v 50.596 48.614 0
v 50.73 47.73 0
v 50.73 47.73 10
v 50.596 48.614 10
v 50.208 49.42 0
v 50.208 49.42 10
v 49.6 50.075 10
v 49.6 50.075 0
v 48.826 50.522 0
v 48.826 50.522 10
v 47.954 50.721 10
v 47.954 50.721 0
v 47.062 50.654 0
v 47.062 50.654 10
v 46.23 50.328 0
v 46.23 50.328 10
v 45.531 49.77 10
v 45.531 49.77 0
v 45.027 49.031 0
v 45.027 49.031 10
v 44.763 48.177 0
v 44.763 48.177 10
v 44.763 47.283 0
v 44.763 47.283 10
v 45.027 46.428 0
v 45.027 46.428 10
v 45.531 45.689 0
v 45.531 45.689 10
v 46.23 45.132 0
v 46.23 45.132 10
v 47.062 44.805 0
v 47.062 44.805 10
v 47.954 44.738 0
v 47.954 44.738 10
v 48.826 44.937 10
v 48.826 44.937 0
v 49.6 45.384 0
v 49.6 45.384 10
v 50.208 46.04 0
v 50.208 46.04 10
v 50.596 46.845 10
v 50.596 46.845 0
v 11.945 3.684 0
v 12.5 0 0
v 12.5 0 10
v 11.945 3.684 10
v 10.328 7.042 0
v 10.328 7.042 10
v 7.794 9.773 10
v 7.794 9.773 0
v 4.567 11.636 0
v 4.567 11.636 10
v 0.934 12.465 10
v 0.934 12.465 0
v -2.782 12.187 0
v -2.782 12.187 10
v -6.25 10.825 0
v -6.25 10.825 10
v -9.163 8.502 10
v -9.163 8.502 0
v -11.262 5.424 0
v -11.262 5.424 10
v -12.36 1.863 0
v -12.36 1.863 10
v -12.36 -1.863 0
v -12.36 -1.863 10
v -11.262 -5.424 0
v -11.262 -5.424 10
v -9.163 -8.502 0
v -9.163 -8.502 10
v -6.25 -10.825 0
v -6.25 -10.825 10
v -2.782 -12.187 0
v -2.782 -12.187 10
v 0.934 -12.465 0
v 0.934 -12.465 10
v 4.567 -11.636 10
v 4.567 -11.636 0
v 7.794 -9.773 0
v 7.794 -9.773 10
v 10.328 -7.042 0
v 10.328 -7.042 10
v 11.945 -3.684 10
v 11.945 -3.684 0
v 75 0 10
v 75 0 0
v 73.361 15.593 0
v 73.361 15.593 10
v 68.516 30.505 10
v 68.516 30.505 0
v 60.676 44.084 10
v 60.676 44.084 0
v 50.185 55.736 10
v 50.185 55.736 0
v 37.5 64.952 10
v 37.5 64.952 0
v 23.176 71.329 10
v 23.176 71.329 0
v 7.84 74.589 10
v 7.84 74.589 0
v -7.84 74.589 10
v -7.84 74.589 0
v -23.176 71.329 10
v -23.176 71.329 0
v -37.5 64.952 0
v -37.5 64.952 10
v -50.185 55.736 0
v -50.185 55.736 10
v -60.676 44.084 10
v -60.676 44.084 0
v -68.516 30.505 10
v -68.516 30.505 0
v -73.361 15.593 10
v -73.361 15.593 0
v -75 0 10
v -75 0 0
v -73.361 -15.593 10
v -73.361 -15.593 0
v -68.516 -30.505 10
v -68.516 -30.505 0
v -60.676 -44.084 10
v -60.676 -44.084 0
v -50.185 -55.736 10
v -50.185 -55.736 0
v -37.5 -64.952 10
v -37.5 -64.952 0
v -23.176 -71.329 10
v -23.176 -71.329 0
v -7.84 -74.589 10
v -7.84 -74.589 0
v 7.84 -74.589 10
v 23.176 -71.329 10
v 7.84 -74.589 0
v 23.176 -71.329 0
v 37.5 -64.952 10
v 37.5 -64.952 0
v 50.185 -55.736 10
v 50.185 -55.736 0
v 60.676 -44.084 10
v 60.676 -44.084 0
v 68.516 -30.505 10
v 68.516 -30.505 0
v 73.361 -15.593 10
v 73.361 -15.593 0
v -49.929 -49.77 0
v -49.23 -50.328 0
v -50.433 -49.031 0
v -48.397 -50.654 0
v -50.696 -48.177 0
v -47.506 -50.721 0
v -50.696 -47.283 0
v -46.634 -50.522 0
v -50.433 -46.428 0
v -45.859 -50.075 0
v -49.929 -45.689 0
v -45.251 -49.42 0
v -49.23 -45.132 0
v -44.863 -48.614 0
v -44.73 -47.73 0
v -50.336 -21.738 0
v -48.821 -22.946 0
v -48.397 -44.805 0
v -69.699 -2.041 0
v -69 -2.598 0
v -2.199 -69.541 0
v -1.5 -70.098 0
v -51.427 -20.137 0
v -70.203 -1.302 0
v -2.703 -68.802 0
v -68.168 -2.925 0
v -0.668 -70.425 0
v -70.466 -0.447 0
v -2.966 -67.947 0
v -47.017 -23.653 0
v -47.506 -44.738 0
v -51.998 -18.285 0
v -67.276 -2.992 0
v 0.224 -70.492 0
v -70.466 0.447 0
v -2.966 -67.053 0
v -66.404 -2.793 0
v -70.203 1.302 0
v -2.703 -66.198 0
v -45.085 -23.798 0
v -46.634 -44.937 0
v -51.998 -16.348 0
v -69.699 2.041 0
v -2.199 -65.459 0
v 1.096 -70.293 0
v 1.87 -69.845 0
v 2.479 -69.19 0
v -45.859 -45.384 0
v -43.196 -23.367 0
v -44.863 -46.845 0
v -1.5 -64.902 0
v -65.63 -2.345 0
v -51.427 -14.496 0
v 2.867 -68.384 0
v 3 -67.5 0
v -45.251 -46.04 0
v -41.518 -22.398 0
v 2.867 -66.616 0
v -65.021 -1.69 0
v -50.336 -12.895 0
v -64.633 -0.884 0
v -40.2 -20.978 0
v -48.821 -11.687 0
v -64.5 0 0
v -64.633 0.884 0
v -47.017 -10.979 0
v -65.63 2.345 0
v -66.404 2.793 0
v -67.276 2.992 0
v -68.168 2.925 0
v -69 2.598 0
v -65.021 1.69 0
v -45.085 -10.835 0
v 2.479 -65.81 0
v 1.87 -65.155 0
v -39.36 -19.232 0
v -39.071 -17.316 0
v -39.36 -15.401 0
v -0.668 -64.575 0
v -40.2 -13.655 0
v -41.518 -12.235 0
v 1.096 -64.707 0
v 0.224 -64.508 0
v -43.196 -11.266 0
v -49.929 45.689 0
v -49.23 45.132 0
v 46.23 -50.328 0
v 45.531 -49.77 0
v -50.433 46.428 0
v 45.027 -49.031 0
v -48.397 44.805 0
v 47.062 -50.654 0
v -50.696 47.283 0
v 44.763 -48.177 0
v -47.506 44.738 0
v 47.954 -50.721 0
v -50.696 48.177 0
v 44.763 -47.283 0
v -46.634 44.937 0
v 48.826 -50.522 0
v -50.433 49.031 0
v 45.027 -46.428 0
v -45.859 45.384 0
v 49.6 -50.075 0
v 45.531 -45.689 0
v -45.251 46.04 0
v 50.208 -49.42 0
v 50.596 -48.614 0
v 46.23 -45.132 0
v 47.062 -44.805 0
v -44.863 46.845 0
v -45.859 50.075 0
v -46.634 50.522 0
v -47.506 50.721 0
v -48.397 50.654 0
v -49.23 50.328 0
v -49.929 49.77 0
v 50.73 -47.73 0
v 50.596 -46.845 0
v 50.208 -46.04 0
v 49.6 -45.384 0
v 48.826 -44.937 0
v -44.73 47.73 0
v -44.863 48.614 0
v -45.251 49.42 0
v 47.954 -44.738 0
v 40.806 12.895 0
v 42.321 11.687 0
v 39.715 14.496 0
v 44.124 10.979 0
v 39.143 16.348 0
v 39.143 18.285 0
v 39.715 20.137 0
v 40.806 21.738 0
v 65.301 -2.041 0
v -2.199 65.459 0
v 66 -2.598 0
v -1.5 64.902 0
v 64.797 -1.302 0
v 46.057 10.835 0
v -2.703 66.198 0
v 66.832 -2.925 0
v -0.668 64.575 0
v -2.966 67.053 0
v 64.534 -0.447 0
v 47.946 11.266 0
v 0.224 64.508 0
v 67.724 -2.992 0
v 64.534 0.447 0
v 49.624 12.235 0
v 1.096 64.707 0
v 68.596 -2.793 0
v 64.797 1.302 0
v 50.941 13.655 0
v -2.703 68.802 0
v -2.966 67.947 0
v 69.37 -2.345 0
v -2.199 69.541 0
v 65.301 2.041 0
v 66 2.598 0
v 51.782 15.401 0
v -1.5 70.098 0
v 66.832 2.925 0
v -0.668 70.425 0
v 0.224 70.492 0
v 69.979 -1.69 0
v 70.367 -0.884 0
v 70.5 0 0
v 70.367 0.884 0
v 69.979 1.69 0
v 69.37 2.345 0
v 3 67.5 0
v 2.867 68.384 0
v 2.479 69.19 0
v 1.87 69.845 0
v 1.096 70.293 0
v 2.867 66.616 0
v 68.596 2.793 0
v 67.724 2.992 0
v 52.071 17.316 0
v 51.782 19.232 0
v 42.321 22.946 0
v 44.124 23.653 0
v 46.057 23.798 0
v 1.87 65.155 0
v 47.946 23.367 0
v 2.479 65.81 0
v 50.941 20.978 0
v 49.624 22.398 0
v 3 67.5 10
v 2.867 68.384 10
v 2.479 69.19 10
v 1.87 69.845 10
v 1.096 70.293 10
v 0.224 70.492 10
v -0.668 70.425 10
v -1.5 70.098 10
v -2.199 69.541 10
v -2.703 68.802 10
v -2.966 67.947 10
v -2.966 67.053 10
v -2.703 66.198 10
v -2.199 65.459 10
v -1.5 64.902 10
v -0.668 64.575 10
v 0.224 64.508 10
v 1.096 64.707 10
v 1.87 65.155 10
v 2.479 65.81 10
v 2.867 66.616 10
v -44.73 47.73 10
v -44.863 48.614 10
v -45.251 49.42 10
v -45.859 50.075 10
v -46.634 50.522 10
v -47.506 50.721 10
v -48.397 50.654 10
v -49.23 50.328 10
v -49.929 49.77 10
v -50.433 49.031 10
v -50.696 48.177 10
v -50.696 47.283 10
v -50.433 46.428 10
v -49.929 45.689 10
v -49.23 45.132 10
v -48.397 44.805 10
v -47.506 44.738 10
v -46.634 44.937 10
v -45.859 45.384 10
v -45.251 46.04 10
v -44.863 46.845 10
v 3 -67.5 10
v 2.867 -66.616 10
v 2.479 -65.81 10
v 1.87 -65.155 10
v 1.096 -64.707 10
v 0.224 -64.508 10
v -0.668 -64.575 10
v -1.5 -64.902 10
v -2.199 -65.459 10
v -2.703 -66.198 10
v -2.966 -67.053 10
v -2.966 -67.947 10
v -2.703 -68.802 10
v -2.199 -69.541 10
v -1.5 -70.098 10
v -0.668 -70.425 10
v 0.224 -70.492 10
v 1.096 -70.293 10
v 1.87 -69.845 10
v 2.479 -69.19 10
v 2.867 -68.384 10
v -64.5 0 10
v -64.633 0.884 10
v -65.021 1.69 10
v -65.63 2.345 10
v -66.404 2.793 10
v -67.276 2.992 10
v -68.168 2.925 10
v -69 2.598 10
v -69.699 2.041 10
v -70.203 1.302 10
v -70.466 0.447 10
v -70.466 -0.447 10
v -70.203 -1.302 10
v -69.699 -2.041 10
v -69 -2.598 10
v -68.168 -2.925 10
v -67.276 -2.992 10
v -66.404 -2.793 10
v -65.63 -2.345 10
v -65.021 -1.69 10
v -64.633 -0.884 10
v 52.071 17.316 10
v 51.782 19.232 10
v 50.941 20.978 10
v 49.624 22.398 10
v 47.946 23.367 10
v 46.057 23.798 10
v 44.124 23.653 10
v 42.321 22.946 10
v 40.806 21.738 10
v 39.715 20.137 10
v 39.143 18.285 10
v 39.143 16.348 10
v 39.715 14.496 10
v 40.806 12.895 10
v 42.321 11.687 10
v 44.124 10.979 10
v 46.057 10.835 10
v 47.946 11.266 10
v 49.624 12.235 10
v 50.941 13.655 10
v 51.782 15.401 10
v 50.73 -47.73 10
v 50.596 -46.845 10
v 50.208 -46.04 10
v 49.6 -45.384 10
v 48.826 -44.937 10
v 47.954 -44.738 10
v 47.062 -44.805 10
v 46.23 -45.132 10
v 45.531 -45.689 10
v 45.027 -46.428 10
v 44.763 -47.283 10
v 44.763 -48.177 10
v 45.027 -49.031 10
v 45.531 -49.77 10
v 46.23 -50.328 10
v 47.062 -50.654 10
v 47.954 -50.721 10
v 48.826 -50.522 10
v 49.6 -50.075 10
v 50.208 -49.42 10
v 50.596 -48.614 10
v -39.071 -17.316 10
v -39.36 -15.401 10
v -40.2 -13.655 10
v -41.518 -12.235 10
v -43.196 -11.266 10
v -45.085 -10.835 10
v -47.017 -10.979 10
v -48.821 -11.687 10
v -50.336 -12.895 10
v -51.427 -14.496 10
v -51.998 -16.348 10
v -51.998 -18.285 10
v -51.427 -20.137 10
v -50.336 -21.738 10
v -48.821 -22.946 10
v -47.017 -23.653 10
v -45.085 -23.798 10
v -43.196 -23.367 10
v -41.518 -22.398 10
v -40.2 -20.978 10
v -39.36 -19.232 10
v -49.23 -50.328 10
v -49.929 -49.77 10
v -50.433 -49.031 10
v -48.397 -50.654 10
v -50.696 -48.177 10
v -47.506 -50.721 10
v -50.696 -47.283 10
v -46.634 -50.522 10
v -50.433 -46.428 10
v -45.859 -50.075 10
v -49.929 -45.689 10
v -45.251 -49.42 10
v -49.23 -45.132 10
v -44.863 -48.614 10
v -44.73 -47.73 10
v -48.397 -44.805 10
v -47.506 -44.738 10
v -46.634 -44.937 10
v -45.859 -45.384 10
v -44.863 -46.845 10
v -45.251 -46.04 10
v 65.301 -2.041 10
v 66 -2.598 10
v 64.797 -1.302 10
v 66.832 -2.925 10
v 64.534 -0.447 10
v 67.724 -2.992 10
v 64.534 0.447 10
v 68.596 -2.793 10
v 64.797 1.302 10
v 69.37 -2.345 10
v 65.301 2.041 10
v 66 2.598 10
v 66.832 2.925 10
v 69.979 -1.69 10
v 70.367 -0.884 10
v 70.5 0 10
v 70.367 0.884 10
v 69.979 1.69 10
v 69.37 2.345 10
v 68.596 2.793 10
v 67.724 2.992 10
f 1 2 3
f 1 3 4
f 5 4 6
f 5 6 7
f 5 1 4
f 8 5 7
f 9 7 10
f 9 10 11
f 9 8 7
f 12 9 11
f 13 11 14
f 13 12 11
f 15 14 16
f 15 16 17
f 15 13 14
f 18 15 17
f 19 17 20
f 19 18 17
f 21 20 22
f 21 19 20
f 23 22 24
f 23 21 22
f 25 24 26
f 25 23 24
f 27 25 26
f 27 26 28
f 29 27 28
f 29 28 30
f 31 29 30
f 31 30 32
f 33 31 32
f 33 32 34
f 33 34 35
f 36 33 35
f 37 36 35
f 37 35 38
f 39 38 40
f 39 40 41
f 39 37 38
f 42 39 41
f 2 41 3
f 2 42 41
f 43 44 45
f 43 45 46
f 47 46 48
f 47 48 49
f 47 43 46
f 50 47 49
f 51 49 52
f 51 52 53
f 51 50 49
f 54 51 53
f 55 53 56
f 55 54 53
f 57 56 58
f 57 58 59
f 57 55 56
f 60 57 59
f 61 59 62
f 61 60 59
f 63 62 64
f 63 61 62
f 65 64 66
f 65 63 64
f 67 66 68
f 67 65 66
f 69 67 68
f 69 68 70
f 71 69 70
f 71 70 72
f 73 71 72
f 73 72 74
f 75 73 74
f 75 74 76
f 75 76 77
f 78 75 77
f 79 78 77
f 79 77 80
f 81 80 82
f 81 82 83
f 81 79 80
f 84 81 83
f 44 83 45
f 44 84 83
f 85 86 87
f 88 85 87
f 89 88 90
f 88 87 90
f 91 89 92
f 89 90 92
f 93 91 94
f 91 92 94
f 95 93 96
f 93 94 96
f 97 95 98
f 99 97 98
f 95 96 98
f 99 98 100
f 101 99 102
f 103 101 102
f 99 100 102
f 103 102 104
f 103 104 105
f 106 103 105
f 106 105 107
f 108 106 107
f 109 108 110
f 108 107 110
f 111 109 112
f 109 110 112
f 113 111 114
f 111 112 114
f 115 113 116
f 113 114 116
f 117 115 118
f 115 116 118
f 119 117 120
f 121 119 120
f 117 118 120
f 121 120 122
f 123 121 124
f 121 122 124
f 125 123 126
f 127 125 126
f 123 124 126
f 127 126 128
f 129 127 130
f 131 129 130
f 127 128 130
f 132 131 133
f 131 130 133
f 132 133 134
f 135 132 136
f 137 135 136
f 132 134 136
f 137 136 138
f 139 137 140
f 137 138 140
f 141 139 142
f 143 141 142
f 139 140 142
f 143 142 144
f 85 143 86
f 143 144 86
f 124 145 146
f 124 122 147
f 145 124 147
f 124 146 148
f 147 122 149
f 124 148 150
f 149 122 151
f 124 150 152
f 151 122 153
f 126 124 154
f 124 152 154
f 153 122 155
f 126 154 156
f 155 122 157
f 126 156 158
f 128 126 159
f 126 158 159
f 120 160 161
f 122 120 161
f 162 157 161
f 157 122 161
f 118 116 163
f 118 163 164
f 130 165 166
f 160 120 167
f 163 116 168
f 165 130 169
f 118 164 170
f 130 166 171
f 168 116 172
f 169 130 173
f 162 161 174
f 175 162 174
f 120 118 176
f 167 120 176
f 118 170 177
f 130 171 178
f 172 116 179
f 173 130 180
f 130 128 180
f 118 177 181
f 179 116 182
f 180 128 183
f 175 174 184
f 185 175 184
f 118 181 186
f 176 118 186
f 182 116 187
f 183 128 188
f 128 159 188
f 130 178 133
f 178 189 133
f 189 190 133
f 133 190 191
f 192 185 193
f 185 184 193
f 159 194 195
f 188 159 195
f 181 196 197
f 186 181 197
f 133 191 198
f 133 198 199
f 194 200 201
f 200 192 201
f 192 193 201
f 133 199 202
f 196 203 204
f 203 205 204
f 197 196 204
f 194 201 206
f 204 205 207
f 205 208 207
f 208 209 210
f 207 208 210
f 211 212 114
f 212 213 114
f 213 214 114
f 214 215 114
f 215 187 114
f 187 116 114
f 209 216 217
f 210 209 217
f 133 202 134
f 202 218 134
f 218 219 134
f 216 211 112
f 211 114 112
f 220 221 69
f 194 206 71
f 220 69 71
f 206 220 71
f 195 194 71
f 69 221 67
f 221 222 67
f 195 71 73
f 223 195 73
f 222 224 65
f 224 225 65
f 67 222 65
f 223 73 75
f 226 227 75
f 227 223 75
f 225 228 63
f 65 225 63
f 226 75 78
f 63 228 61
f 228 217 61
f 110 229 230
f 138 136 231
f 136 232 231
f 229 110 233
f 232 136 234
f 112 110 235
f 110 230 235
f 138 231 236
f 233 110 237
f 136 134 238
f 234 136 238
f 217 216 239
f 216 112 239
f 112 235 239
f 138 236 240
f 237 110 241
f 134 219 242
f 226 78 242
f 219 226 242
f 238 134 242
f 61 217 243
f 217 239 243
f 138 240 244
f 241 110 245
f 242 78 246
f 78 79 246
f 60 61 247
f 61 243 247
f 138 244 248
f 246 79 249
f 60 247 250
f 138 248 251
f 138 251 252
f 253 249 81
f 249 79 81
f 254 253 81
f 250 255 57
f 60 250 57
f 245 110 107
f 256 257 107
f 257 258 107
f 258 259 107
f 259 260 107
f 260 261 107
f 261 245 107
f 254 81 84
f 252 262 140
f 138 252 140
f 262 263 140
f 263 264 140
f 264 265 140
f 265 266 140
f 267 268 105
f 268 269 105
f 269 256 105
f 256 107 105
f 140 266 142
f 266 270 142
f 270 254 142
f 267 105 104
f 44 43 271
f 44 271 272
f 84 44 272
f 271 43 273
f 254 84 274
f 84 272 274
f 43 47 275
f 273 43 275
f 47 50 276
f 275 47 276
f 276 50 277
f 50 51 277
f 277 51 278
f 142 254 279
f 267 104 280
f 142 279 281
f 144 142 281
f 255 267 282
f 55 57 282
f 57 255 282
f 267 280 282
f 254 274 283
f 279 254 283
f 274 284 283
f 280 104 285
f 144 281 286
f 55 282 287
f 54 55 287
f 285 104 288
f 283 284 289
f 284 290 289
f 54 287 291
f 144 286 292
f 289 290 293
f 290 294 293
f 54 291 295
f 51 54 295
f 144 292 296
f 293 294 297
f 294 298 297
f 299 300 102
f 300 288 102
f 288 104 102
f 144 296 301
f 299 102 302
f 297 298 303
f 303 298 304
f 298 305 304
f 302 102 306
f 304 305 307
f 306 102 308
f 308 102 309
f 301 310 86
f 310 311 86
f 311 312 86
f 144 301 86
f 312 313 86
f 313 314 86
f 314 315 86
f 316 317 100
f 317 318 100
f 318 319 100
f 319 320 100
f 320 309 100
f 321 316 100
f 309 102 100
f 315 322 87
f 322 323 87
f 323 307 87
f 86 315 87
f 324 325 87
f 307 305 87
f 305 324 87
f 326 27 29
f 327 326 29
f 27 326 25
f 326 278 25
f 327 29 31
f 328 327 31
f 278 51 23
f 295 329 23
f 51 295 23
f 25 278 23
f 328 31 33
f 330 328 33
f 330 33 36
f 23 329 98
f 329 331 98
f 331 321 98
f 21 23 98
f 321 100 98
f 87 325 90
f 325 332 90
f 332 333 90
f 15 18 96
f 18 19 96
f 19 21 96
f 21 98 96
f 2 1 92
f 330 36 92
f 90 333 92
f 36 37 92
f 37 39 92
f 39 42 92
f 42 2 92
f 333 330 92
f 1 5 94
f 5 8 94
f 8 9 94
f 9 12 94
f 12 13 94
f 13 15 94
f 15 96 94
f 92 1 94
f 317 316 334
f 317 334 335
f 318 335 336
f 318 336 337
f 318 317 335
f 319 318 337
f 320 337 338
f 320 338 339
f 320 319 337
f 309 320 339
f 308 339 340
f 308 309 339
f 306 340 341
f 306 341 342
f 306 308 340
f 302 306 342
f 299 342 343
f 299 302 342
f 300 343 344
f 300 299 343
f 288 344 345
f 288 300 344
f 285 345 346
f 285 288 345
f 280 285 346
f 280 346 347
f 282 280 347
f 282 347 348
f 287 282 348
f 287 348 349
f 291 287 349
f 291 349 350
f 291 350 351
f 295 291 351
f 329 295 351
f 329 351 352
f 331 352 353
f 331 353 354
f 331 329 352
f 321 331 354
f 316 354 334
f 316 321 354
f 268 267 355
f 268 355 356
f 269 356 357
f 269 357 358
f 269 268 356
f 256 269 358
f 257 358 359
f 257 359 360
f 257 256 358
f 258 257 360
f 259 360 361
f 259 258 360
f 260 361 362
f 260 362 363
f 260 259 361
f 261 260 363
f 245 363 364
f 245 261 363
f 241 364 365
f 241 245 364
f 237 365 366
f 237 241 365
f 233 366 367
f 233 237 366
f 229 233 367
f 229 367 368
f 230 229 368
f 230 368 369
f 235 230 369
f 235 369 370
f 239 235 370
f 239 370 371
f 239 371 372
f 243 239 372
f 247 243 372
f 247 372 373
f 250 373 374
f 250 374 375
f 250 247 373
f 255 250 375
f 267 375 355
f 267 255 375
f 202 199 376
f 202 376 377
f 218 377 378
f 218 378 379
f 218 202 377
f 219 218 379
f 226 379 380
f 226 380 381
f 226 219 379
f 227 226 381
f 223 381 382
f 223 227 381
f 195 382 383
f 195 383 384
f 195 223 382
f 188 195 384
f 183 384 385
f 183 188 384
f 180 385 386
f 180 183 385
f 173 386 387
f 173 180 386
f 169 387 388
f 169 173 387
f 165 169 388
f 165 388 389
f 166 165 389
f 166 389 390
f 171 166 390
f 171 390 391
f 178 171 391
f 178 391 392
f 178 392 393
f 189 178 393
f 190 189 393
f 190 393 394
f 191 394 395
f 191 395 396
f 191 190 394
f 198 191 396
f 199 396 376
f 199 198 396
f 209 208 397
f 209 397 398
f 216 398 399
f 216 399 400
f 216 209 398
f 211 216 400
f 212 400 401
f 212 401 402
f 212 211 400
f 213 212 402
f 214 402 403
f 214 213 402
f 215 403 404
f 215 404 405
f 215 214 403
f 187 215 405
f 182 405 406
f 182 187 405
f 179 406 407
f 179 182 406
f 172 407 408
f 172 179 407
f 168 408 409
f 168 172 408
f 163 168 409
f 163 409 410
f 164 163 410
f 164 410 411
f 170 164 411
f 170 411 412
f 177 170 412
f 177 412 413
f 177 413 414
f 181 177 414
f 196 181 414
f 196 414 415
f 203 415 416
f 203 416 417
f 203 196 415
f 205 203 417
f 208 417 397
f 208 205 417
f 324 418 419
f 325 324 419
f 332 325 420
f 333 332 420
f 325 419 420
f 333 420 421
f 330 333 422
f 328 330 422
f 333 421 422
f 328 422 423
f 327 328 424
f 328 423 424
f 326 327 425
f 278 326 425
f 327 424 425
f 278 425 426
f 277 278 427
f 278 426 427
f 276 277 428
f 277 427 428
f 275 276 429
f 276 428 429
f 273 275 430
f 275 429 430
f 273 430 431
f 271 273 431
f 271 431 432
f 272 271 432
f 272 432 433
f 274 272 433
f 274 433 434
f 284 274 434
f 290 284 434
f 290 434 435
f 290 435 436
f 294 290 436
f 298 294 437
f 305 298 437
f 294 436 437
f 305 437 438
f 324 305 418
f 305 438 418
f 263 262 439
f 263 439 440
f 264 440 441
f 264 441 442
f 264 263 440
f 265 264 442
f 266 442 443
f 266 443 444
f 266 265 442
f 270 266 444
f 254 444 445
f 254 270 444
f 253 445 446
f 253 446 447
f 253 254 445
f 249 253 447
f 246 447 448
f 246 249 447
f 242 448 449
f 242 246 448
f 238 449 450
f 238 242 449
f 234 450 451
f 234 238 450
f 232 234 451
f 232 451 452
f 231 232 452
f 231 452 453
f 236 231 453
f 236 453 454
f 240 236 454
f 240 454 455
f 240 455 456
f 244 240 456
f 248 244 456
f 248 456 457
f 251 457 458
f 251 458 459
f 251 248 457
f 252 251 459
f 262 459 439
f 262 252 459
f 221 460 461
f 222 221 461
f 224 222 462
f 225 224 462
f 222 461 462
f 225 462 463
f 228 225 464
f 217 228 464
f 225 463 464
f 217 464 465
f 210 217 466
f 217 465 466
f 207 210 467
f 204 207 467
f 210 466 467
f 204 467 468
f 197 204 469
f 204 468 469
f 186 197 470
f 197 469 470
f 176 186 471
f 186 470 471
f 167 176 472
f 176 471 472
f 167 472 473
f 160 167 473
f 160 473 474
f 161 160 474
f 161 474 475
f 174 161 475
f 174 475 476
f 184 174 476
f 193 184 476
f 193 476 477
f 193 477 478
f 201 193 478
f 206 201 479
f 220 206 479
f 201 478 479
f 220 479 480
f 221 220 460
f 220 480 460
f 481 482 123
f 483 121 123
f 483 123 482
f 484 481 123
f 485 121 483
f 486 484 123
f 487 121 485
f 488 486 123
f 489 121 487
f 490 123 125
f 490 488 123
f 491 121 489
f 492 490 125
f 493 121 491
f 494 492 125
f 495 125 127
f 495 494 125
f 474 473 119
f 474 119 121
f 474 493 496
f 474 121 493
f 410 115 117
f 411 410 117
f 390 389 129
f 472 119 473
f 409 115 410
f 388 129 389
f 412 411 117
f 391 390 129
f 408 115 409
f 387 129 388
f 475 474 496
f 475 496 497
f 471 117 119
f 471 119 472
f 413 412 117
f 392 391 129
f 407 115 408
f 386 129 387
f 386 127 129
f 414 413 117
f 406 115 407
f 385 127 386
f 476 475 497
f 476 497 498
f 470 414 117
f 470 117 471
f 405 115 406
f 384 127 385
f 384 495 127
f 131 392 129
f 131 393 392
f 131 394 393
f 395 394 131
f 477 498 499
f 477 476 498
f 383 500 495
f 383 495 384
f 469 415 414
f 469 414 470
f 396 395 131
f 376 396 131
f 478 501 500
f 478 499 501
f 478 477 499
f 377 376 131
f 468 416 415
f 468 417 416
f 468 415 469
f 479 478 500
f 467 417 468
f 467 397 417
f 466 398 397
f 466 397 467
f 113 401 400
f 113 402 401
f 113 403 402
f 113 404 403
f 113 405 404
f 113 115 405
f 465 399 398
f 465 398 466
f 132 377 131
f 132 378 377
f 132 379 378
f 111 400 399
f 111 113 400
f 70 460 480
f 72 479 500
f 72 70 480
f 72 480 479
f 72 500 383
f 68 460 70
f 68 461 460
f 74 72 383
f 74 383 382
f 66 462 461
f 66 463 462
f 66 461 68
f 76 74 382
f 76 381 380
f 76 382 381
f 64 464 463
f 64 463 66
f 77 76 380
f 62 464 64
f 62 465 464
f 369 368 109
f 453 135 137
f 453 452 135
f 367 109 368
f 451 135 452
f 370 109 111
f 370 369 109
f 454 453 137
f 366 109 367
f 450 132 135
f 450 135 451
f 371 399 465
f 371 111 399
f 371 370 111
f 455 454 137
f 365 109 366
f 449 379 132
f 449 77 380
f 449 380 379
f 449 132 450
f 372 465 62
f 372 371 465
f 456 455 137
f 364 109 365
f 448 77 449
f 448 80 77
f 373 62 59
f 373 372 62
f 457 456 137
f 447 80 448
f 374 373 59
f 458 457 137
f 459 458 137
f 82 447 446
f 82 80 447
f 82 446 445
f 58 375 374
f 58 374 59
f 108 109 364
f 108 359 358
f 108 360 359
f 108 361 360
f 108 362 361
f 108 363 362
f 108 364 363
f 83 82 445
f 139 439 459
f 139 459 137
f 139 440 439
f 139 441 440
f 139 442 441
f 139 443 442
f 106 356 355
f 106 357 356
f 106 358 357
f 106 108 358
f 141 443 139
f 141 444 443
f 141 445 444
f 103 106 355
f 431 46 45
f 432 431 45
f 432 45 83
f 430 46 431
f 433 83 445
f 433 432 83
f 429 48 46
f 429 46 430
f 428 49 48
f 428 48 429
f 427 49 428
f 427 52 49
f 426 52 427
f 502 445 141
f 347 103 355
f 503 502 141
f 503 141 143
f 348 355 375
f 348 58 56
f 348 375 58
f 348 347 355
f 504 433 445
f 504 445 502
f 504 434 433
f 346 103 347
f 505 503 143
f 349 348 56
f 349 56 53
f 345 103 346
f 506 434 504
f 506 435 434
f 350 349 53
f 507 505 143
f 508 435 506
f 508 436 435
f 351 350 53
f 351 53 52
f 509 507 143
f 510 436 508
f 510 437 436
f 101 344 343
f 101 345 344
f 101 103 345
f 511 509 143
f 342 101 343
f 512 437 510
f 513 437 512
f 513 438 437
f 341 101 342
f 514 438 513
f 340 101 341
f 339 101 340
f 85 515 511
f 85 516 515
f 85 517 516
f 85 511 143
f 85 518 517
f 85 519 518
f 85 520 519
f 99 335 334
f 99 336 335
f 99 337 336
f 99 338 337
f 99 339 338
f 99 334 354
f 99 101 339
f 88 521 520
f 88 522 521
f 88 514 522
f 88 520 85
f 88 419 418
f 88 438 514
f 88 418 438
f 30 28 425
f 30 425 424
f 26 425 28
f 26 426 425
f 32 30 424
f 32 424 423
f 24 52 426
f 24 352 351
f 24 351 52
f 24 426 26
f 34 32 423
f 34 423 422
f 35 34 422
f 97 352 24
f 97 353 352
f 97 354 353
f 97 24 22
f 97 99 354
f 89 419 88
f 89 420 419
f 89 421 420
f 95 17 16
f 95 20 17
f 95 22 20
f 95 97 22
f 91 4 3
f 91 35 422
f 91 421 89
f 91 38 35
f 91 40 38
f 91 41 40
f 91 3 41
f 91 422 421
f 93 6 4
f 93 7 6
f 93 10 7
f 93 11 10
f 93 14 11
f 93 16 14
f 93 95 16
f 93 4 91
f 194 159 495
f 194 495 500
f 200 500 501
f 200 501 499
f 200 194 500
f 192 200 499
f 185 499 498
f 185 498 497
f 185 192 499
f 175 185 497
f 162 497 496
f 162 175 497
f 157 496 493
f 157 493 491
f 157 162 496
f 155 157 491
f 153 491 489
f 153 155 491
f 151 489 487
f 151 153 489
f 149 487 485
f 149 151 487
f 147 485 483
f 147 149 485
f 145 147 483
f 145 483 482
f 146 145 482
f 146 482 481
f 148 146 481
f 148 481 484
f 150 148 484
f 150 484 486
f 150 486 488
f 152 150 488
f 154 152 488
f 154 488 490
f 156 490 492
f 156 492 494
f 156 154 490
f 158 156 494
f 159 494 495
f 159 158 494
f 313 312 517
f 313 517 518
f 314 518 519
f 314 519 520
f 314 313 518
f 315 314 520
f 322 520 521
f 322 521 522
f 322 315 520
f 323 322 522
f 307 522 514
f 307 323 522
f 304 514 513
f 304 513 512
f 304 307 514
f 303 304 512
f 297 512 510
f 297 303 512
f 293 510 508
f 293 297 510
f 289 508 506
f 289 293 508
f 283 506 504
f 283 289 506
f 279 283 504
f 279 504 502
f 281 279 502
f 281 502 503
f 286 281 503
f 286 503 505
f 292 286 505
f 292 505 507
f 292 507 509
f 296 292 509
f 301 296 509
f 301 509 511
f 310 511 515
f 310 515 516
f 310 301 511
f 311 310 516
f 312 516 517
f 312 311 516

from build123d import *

# Parameters (mm, degrees)
CROQUIS1_R              = 75
CROQUIS1_R_2            = 3
CROQUIS1_R_3            = 12.5
SALIENTE_EXTRUIR1_DEPTH = 10
CROQUIS2_R              = 6.5
CORTAR_EXTRUIR1_DEPTH   = 10


with BuildPart() as part:
    # Croquis1 → Saliente-Extruir1 (new body)
    with BuildSketch(Plane.XY):
        Circle(CROQUIS1_R)
        with Locations((0, 67.5)):
            Circle(CROQUIS1_R_2, mode=Mode.SUBTRACT)
        with Locations((47.72970773, 47.72970773)):
            Circle(CROQUIS1_R_2, mode=Mode.SUBTRACT)
        with Locations((67.5, 0)):
            Circle(CROQUIS1_R_2, mode=Mode.SUBTRACT)
        with Locations((47.72970773, -47.72970773)):
            Circle(CROQUIS1_R_2, mode=Mode.SUBTRACT)
        with Locations((0, -67.5)):
            Circle(CROQUIS1_R_2, mode=Mode.SUBTRACT)
        with Locations((-47.72970773, -47.72970773)):
            Circle(CROQUIS1_R_2, mode=Mode.SUBTRACT)
        with Locations((-67.5, 0)):
            Circle(CROQUIS1_R_2, mode=Mode.SUBTRACT)
        with Locations((-47.72970773, 47.72970773)):
            Circle(CROQUIS1_R_2, mode=Mode.SUBTRACT)
        Circle(CROQUIS1_R_3, mode=Mode.SUBTRACT)
    extrude(amount=SALIENTE_EXTRUIR1_DEPTH)

    # Croquis2 → Cortar-Extruir1 (cut)
    with BuildSketch(Plane.XY.offset(10)):
        with Locations((45.570866947, 17.316425315)):
            Circle(CROQUIS2_R)
        with Locations((-45.570866947, -17.316425315)):
            Circle(CROQUIS2_R)
    extrude(amount=-CORTAR_EXTRUIR1_DEPTH, mode=Mode.SUBTRACT)


solid = part.part
